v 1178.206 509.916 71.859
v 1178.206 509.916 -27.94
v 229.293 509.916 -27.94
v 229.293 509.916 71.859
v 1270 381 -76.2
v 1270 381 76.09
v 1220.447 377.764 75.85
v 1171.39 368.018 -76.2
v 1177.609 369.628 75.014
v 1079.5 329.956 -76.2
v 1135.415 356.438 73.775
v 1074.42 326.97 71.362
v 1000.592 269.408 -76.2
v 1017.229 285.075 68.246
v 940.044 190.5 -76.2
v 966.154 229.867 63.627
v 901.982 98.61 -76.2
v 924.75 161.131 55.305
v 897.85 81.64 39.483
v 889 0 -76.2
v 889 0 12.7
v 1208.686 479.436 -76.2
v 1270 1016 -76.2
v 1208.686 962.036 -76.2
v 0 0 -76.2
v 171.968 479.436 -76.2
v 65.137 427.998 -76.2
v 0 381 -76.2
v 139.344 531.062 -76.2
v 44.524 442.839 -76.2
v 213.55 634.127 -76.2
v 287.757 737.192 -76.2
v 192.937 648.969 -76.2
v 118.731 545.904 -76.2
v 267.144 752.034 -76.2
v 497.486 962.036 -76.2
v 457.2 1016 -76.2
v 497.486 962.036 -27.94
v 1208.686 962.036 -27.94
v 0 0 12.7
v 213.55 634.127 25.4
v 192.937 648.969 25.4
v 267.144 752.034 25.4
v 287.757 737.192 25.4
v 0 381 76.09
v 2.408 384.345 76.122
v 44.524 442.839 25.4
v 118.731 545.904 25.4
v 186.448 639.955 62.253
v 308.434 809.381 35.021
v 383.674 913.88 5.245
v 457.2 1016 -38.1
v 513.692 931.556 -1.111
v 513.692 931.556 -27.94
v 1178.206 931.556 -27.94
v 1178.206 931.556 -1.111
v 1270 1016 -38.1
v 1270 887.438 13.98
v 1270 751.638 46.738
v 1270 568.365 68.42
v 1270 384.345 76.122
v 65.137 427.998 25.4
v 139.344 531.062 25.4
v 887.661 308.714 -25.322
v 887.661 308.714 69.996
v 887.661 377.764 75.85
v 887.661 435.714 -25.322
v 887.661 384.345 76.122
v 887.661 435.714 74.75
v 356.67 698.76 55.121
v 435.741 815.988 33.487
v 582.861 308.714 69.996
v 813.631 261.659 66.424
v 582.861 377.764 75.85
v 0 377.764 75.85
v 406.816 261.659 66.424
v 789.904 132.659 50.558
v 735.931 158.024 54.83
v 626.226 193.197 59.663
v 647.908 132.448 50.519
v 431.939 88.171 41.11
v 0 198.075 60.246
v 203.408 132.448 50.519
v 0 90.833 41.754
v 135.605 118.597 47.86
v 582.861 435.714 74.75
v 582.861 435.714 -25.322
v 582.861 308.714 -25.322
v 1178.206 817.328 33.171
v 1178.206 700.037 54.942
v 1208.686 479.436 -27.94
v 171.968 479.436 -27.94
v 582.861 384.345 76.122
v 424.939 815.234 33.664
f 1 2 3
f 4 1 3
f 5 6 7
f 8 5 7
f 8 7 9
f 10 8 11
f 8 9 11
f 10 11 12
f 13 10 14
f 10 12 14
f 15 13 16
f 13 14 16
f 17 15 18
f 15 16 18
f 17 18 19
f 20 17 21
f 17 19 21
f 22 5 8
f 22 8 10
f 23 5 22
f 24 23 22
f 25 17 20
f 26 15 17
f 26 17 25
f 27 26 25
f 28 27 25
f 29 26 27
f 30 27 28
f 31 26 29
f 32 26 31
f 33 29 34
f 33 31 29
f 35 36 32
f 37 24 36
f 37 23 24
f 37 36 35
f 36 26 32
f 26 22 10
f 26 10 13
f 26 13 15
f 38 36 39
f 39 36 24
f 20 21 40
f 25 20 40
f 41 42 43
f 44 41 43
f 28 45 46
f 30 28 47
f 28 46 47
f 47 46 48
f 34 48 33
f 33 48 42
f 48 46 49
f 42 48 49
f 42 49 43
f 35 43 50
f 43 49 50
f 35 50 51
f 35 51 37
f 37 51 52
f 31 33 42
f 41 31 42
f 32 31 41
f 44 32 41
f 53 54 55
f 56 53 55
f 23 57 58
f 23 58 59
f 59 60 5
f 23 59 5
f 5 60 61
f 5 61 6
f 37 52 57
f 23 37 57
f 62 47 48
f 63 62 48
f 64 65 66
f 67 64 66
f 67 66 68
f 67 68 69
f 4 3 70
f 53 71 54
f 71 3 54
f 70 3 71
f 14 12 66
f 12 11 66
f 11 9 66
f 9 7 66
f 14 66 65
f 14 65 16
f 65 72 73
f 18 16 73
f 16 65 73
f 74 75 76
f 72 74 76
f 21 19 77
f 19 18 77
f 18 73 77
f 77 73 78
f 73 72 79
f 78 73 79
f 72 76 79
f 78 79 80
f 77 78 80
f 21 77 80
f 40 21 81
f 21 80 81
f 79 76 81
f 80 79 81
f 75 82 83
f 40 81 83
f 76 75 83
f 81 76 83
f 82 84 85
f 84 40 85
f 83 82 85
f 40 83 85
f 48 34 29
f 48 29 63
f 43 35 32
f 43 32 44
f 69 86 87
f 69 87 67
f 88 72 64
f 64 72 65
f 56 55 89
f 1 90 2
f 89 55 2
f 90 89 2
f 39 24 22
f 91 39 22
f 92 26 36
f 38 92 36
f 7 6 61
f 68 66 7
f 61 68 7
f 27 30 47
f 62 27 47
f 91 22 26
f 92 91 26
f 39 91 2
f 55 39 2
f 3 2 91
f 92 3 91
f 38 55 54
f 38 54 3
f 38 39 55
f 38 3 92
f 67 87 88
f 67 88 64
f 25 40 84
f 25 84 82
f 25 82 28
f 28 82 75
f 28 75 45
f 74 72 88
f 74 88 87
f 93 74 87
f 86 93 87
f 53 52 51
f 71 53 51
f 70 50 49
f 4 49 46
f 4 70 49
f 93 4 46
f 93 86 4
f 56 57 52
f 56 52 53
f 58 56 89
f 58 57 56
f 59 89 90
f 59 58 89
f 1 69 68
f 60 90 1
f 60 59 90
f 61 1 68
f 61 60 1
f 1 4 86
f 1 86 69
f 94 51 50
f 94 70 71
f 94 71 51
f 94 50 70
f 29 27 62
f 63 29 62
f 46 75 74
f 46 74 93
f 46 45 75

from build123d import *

# Parameters (mm, degrees)
BOSS_EXTRUDE1_DEPTH = 76.2
CUT_EXTRUDE1_DEPTH  = 1629.177643871
CUT_EXTRUDE2_DEPTH  = 1629.177644016
FILLET1_R           = 50.8
CUT_EXTRUDE3_DEPTH  = 48.26
CUT_EXTRUDE4_DEPTH  = 1506.588524386
SKETCH5_W           = 101.6
SKETCH5_H           = 127
CUT_EXTRUDE5_DEPTH  = 25.4
LPATTERN1_COUNT     = 2
LPATTERN1_PITCH     = 254
SKETCH6_W           = 304.8
SKETCH6_H           = 127
CUT_EXTRUDE6_DEPTH  = 153.67


with BuildPart() as part:
    # Sketch1 → Boss-Extrude1 (new, symmetric)
    with BuildSketch(Plane.XY):
        with BuildLine():
            Line((0, 0), (0, 381))
            Line((0, 381), (457.2, 1016))
            Line((457.2, 1016), (1270, 1016))
            Line((1270, 1016), (1270, 381))
            ThreePointArc((1270, 381), (1000.592316368, 269.407683632), (889, 0))
            Line((889, 0), (0, 0))
        make_face()
    extrude(amount=BOSS_EXTRUDE1_DEPTH, both=True)

    # Sketch2 → Cut-Extrude1 (cut, through all)
    with BuildSketch(Plane(origin=(1270, 0, 0), x_dir=(0, 0, -1), z_dir=(1, 0, 0))):
        with BuildLine():
            Line((-76.2, 1016), (38.1, 1016))
            add(Edge.make_bspline(
                [(38.1, 1016), (-59.769782928, 824.490487528), (-71.194008123, 596.511314057), (-76.2, 381)],
                knots=[0, 0, 0, 0, 1, 1, 1, 1], degree=3))
            Line((-76.2, 381), (-76.2, 1016))
        make_face()
    extrude(amount=-CUT_EXTRUDE1_DEPTH, mode=Mode.SUBTRACT)

    # Sketch3 → Cut-Extrude2 (cut, through all)
    with BuildSketch(Plane.ZY):
        with BuildLine():
            Line((76.2, 0), (12.7, 0))
            add(Edge.make_bspline(
                [(76.2, 381), (64.47102467, 274.36986488), (67.170280271, 132.109019993), (12.7, 0)],
                knots=[0, 0, 0, 0, 1, 1, 1, 1], degree=3))
            Line((76.2, 381), (76.2, 0))
        make_face()
    extrude(amount=-CUT_EXTRUDE2_DEPTH, mode=Mode.SUBTRACT)

    # Fillet1
    fillet1_edges = [part.edges().sort_by_distance(p)[0] for p in [
        (635, 381, 76.2),
    ]]
    fillet(fillet1_edges, radius=FILLET1_R)

    # Sketch4 → Cut-Extrude3 (cut)
    with BuildSketch(Plane(origin=(0, 0, -76.2), x_dir=(-1, 0, 0), z_dir=(0, 0, -1))):
        Polygon((-1208.685916752, 962.035600553), (-1208.685916752, 479.435600553), (-171.968106524, 479.435600553), (-497.485916752, 962.035600553), align=None)
    extrude(amount=-CUT_EXTRUDE3_DEPTH, mode=Mode.SUBTRACT)

    # 3DSketch1 → Cut-Extrude4 (cut, through all)
    with BuildSketch(Plane(origin=(1178.205916752, 931.555600553, -27.94), x_dir=(-0.9138470118423624, -0.4060586644153593, 0), z_dir=(0, 0, 1))):
        Polygon((0, 0), (171.210575264, 385.314454073), (1038.372129325, 0), (607.263673126, -269.831462884), align=None)
    extrude(amount=CUT_EXTRUDE4_DEPTH, mode=Mode.SUBTRACT)

    # Sketch5 → Cut-Extrude5 (cut)
    with BuildSketch(Plane(origin=(-180.663856691, 130.077976818, 0), x_dir=(0, 0, 1), z_dir=(-0.8115343414514944, 0.5843047258450759, 0))):
        with Locations((-25.4, 448.894584093)):
            Rectangle(SKETCH5_W, SKETCH5_H)
    cut_extrude5 = extrude(amount=-CUT_EXTRUDE5_DEPTH, mode=Mode.SUBTRACT)

    # LPattern1: Cut-Extrude5 ×2
    with Locations(*[Vector(0.5843047258450755, 0.8115343414514946, 0) * (i * LPATTERN1_PITCH) for i in range(1, LPATTERN1_COUNT)]):
        add(cut_extrude5, mode=Mode.SUBTRACT)

    # Sketch6 → Cut-Extrude6 (cut)
    with BuildSketch(Plane.XY.offset(128.348177056)):
        with Locations((735.261288267, 372.214025497)):
            Rectangle(SKETCH6_W, SKETCH6_H)
    extrude(amount=-CUT_EXTRUDE6_DEPTH, mode=Mode.SUBTRACT)


solid = part.part
